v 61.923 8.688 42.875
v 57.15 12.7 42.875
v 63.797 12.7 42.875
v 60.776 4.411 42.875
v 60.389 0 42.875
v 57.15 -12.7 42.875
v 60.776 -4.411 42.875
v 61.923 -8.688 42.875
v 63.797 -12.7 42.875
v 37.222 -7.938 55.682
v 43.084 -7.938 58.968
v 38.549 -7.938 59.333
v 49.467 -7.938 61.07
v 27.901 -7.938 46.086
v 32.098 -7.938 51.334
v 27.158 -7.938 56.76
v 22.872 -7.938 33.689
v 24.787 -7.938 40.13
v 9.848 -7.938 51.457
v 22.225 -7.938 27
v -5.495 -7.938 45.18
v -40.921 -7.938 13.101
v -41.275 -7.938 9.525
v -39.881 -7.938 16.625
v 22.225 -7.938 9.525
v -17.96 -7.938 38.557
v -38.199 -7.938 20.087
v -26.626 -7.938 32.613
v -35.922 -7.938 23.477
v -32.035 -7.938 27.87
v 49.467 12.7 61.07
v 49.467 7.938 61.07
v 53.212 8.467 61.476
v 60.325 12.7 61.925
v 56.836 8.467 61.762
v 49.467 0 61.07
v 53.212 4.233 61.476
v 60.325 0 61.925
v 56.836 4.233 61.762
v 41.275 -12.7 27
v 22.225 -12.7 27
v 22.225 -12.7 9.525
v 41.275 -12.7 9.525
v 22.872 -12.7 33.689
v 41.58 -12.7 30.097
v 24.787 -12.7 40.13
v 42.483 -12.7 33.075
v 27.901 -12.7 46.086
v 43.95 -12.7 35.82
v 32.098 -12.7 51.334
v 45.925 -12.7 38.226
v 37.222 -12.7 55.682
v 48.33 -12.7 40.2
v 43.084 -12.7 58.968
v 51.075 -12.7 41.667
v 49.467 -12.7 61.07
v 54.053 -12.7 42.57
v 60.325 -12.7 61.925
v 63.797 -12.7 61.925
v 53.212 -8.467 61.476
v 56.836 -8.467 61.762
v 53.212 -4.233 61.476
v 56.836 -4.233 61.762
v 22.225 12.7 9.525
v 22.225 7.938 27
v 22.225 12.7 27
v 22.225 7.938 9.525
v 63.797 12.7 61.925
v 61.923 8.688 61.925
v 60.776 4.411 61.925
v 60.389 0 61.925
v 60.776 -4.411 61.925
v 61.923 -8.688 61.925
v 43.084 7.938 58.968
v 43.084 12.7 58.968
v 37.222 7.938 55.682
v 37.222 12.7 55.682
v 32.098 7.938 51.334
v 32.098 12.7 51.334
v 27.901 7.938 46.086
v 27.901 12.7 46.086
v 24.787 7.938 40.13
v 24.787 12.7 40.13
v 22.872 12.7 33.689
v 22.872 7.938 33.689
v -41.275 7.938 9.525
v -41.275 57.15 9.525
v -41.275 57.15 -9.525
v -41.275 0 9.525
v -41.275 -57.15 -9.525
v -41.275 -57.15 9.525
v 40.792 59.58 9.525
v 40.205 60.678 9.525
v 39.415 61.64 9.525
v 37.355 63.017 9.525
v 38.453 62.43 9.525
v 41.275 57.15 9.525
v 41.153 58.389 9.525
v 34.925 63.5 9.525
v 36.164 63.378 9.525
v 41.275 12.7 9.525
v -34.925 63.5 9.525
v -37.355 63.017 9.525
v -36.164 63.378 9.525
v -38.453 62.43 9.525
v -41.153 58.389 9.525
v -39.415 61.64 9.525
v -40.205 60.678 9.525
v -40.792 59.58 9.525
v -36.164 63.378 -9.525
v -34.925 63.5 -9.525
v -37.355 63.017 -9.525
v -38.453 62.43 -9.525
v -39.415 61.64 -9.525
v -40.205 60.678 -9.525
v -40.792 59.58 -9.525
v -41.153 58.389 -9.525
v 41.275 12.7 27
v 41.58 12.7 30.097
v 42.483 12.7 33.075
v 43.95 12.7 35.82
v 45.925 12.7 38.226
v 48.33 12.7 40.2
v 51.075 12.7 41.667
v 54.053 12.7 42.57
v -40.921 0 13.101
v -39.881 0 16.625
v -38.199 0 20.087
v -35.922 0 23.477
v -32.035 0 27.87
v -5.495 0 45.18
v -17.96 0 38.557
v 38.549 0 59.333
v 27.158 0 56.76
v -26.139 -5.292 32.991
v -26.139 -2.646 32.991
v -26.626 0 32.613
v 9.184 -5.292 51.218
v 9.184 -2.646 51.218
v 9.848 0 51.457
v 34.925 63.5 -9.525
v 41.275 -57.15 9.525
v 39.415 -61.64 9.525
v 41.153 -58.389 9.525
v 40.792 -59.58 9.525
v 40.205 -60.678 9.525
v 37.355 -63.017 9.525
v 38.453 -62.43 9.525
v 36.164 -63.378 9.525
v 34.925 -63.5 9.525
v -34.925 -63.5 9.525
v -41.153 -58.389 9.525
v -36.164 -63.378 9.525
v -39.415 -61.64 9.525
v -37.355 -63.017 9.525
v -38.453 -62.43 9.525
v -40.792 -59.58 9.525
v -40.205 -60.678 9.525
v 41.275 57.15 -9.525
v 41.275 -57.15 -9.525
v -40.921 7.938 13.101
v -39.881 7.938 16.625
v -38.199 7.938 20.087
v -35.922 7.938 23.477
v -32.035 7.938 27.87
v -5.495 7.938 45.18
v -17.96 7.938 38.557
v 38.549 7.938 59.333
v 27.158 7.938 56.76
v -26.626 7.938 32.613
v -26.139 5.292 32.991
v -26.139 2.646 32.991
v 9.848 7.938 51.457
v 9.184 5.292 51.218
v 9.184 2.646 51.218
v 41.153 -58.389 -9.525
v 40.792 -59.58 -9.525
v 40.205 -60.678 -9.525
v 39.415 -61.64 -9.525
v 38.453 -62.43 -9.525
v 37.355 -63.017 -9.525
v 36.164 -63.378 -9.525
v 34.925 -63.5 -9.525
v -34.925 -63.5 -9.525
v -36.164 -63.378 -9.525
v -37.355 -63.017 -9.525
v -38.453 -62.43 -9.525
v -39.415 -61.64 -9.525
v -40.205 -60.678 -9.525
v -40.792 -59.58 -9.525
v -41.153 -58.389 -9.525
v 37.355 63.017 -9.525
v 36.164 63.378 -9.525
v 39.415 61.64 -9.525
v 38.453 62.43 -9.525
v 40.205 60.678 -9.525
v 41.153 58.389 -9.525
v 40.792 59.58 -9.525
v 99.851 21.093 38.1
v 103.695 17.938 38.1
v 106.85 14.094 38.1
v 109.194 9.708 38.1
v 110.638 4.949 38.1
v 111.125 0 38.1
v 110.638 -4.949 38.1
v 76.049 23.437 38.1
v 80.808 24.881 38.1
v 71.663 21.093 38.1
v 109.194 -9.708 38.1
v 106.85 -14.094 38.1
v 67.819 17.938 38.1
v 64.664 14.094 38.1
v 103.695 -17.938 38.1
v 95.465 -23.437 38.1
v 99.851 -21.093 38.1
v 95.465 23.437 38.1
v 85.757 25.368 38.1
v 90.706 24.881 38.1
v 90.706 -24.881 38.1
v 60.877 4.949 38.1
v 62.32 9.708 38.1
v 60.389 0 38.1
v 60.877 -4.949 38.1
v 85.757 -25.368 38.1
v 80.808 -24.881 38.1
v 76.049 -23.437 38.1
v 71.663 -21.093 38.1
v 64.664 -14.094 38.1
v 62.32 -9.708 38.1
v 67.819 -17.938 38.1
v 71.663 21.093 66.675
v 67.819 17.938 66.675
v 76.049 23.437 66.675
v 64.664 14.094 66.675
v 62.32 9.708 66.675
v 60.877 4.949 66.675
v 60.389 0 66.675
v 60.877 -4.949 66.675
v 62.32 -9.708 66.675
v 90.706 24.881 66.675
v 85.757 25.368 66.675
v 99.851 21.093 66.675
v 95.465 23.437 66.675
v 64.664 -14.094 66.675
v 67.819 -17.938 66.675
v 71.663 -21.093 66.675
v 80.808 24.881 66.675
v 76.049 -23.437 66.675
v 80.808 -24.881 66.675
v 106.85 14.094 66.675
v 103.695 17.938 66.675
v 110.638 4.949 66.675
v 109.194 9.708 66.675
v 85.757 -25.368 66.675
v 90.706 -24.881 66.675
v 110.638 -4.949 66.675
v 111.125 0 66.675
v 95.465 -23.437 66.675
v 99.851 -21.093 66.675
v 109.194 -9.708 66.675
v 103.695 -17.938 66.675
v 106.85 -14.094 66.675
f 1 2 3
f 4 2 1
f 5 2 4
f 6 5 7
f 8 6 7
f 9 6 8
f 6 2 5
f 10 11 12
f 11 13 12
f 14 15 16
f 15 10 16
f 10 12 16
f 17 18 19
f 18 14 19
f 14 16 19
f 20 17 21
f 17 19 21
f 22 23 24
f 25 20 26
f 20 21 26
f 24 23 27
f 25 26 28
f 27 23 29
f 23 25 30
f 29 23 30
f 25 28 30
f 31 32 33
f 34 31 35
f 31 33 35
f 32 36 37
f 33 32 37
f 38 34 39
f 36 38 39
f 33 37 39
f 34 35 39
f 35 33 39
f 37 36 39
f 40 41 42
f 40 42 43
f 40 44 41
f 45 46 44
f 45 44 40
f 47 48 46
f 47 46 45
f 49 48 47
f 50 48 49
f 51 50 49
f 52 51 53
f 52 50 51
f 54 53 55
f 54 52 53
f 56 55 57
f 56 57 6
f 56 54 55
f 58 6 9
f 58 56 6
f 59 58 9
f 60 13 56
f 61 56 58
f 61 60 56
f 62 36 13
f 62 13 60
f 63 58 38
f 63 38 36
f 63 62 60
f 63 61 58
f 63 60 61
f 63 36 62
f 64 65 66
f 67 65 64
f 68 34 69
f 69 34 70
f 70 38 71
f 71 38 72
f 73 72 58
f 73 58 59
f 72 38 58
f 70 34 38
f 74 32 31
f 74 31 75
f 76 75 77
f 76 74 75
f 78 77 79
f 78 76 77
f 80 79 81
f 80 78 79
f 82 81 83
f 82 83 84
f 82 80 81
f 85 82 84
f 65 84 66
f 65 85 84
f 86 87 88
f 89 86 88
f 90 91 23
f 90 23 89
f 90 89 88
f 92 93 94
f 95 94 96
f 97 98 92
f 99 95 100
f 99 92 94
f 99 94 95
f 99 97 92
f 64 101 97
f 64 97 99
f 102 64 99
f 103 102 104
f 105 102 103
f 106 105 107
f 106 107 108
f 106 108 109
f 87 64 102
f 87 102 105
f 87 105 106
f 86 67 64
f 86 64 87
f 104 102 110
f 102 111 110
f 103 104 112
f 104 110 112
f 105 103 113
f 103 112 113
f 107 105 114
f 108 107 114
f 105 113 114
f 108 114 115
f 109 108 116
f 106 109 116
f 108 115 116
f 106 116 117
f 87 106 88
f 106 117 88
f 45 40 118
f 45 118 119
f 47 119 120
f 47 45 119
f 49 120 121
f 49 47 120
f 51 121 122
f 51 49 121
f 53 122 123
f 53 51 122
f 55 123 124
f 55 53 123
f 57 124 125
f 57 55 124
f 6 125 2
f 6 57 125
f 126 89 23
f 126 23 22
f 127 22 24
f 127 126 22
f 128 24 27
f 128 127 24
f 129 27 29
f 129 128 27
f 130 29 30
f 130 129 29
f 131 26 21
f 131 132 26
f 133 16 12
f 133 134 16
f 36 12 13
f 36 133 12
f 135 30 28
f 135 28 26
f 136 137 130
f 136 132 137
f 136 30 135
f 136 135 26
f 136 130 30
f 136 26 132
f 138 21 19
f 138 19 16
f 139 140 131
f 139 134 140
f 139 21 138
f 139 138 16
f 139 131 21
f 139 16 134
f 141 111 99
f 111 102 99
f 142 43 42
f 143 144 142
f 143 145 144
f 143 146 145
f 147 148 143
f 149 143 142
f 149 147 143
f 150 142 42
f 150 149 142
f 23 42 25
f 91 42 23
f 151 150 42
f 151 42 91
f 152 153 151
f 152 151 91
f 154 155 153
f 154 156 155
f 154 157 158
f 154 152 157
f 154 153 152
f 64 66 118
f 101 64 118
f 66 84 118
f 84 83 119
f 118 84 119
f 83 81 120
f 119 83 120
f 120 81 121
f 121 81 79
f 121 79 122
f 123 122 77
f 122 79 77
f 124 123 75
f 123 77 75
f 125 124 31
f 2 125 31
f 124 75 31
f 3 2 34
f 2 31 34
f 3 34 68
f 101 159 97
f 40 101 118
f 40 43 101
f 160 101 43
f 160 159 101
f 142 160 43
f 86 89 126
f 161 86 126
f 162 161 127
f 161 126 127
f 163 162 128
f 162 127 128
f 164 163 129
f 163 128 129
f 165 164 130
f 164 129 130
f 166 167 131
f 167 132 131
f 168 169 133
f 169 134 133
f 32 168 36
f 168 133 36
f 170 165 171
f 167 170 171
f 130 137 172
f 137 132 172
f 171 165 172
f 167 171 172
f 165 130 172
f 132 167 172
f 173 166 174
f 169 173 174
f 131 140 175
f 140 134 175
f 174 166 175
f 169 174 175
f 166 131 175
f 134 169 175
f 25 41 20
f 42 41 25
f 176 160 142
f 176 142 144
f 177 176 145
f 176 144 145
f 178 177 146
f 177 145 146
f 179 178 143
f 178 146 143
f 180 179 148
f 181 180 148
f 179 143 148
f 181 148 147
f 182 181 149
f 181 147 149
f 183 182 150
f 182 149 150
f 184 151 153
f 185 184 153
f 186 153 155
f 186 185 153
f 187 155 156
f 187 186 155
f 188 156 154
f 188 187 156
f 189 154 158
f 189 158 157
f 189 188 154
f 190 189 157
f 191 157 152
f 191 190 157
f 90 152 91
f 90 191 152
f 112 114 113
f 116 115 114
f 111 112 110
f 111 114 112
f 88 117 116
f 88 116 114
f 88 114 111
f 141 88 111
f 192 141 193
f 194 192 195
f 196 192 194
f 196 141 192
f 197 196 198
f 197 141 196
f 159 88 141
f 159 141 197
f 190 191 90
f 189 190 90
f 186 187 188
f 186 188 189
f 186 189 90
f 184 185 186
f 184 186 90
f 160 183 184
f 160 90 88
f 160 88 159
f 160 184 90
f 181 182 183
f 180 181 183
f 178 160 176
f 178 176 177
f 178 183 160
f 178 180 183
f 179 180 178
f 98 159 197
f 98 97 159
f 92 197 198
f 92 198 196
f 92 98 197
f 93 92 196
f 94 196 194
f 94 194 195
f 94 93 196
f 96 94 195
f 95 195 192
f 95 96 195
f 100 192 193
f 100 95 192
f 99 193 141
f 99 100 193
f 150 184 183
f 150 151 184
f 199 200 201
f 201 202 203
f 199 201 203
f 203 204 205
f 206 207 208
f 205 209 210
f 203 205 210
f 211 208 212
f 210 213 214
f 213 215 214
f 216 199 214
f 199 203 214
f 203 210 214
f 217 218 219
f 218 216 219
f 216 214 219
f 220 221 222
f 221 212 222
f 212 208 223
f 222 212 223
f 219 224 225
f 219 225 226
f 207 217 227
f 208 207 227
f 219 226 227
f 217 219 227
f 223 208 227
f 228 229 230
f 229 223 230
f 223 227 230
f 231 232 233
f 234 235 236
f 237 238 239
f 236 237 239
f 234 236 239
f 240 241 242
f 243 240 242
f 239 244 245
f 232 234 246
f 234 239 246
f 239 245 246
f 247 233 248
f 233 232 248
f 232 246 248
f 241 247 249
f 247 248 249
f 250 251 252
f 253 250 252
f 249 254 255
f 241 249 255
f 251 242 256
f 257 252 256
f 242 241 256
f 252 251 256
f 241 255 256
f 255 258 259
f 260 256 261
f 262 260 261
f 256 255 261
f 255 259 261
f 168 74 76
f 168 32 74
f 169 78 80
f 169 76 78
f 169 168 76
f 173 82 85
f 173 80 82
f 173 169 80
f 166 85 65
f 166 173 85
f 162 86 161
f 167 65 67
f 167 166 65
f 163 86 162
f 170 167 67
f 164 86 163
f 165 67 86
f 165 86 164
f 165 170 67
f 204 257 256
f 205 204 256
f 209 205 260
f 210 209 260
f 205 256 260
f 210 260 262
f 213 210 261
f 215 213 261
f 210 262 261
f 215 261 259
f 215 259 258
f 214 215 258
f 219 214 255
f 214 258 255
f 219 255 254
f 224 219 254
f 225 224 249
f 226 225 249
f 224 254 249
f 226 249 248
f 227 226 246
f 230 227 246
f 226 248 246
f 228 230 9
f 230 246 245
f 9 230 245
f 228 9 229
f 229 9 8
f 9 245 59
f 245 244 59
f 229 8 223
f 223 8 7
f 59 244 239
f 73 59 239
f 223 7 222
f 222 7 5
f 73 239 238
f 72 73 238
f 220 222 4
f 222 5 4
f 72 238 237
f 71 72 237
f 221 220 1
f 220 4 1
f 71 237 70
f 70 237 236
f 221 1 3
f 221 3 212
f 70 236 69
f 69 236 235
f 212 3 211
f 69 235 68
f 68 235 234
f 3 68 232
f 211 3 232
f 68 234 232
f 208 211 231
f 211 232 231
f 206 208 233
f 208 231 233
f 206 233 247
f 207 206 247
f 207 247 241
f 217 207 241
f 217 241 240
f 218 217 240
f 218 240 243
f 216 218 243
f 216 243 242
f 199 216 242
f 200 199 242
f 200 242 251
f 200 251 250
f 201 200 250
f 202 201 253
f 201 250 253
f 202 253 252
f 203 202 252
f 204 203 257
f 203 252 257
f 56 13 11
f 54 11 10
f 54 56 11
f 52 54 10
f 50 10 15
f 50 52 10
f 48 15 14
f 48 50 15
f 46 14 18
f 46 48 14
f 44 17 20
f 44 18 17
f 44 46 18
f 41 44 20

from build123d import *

# Parameters (mm, degrees)
F1_DEPTH = 63.5
F0_W     = 25.432032
F0_H     = 19.05
F2_DEPTH = 12.7
F3_DEPTH = 7.9375
F5_R     = 6.35


with BuildPart() as f1:
    # F0 (on Front) → F1 (new body, symmetric)
    with BuildSketch(Plane.XZ):
        Polygon((-41.275, -9.525), (41.275, -9.525), (41.275, 9.525), (22.225, 9.525), (-41.275, 9.525), align=None)
    extrude(amount=F1_DEPTH, both=True)

    # F0 (on Front) → F2 (join, symmetric)
    with BuildSketch(Plane.XZ):
        with BuildLine():
            Line((22.225, 9.525), (41.275, 9.525))
            Line((41.275, 9.525), (41.275, 27.0002))
            ThreePointArc((41.275, 27.0002), (45.92468, 38.22552), (57.15, 42.8752))
            Line((57.15, 42.8752), (60.325, 42.8752))
            Line((60.325, 42.8752), (60.325, 61.9252))
            add(Edge.make_bspline(
                [(49.467139, 61.069677), (53.266312, 61.53517), (56.908996, 61.825166), (60.325, 61.9252)],
                knots=[103.848295, 103.848295, 103.848295, 103.848295, 114.316845, 114.316845, 114.316845, 114.316845], degree=3))
            ThreePointArc((49.467139, 61.069677), (29.872907, 48.811111), (22.225, 27.0002))
            Line((22.225, 27.0002), (22.225, 9.525))
        make_face()
        with Locations((73.041016, 52.4002)):
            Rectangle(F0_W, F0_H)
    extrude(amount=F2_DEPTH, both=True)

    # F0 (on Front) → F3 (join, symmetric)
    with BuildSketch(Plane.XZ):
        with BuildLine():
            add(Edge.make_bspline(
                [(-41.275, 9.525), (-41.308278, 34.564084), (11.77924, 56.451974), (49.467139, 61.069677)],
                knots=[0, 0, 0, 0, 103.848295, 103.848295, 103.848295, 103.848295], degree=3))
            Line((-41.275, 9.525), (22.225, 9.525))
            Line((22.225, 9.525), (22.225, 27.0002))
            ThreePointArc((22.225, 27.0002), (29.872907, 48.811111), (49.467139, 61.069677))
        make_face()
    extrude(amount=F3_DEPTH, both=True)

    # F0 (on Front) → F4 (revolve)
    with BuildSketch(Plane.XZ):
        Polygon((85.757032, 66.675), (85.757032, 61.9252), (85.757032, 42.8752), (85.757032, 38.1), (111.125, 38.1), (111.125, 66.675), align=None)
    revolve(axis=Axis((85.757032, 0, 52.3875), (0, 0, -1)))

    # F5
    f5_edges = [f1.edges().sort_by_distance(p)[0] for p in [
        (41.275, -63.5, 0),
        (-41.275, -63.5, 0),
        (-41.275, 63.5, 0),
        (41.275, 63.5, 0),
    ]]
    fillet(f5_edges, radius=F5_R)


solid = f1.part
